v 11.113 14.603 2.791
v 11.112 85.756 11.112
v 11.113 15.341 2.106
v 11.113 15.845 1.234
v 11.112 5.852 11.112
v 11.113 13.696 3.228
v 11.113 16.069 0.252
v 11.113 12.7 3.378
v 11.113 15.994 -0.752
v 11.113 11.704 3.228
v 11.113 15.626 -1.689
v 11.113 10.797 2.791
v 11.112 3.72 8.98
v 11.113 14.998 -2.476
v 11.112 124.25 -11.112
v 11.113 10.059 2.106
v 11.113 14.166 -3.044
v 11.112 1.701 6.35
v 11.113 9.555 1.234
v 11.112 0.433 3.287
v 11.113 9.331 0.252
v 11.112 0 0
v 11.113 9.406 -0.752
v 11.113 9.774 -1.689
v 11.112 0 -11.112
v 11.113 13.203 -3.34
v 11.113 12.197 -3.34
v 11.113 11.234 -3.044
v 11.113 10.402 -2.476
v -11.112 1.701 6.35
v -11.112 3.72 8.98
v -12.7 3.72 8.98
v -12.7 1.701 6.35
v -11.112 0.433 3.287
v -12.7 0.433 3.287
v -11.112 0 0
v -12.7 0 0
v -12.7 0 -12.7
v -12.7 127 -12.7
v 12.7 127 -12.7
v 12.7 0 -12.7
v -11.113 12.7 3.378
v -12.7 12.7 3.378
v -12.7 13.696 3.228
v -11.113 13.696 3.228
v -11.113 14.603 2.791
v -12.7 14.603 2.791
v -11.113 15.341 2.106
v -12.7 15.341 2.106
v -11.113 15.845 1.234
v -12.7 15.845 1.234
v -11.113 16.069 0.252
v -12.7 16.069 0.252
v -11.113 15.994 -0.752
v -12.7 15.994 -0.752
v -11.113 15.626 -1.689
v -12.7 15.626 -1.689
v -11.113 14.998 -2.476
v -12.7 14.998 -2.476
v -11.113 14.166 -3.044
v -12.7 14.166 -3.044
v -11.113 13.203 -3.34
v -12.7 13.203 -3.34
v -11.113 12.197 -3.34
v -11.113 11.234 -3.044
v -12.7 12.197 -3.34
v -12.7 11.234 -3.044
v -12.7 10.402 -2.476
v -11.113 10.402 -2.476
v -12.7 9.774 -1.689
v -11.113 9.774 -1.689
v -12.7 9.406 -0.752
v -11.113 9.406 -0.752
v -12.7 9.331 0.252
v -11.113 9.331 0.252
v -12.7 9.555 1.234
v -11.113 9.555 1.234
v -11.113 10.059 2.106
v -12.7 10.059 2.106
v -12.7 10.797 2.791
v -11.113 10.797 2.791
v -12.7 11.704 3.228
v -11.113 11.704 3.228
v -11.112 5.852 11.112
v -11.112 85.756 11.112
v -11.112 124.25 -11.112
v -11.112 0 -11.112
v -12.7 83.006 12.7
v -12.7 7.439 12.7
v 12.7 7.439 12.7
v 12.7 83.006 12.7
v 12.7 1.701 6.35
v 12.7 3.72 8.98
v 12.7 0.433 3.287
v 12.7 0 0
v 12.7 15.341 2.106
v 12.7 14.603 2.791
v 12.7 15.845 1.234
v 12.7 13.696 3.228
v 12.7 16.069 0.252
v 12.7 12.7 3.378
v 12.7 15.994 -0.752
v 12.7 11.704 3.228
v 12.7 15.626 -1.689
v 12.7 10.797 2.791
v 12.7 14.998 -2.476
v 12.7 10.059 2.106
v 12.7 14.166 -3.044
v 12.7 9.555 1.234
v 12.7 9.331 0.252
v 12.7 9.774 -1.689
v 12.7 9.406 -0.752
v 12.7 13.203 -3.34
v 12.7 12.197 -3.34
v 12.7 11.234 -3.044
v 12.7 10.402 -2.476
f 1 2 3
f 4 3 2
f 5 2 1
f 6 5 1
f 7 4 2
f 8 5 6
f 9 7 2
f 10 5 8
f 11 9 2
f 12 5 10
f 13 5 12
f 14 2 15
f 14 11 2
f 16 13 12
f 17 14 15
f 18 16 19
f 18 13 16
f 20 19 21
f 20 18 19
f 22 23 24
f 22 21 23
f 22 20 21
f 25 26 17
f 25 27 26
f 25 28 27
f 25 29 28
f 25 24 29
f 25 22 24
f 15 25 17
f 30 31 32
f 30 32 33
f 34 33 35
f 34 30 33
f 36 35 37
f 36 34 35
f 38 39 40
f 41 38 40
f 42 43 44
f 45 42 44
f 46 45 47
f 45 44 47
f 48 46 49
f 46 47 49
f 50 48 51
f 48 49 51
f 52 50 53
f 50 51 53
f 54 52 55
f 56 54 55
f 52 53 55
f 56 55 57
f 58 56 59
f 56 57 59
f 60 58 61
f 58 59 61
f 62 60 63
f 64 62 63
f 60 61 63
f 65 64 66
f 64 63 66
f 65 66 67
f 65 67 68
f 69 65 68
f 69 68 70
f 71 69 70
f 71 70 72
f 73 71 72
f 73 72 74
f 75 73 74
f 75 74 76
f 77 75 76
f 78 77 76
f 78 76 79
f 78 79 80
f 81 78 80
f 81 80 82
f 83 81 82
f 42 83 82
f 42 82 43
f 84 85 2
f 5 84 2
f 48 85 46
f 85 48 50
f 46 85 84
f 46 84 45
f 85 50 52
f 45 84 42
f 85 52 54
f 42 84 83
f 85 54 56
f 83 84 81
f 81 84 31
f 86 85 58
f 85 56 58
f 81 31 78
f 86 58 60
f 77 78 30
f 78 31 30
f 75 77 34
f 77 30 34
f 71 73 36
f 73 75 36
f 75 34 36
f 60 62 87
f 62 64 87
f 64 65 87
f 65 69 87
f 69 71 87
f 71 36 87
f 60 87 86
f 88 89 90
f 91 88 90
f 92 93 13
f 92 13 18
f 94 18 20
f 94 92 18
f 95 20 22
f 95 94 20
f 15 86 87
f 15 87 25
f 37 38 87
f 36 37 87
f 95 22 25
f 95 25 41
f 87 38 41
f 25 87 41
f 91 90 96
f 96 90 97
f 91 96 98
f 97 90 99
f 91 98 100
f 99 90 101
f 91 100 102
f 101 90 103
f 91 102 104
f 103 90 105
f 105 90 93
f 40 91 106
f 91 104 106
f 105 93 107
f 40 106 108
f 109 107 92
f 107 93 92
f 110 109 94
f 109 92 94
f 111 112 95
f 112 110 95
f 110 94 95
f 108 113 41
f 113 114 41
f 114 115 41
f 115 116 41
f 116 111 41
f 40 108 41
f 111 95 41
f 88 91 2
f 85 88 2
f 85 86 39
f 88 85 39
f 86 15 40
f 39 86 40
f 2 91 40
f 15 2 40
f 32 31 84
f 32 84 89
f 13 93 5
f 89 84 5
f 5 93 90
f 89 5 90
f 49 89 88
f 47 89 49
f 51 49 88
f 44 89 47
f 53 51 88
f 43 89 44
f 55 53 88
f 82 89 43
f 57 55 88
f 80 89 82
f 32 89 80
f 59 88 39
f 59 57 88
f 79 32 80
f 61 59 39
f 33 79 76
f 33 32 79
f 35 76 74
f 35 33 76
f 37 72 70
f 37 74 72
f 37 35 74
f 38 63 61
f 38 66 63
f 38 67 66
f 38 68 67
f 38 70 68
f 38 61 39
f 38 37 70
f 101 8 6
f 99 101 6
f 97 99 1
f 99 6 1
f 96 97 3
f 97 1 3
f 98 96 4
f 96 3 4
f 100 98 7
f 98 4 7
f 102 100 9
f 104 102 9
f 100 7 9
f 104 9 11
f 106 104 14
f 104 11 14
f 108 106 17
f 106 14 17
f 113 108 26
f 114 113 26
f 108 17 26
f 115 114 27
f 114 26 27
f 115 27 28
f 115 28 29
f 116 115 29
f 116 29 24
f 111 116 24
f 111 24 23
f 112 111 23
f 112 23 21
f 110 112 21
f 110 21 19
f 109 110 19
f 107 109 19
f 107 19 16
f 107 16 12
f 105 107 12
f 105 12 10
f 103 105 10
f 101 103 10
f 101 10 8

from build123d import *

# Parameters (mm, degrees)
SKETCH1_W               = 25.4
SKETCH1_H               = 25.4
SKETCH1_W_2             = 22.225
SKETCH1_H_2             = 22.225
EXTRUDE1_DEPTH          = 127
EXTRUDE3_DEPTH          = 131.136274728
F_1_4_CLEARANCE_HOLE1_D = 6.7564
EXTRUDE4_DEPTH          = 131.136274728
EXTRUDE5_DEPTH          = 131.136274728


with BuildPart() as part:
    # Sketch1 → Extrude1 (new body)
    with BuildSketch(Plane(origin=(0, 0, 0), x_dir=(1, 0, 0), z_dir=(0, 1, 0))):
        Rectangle(SKETCH1_W, SKETCH1_H)
        Rectangle(SKETCH1_W_2, SKETCH1_H_2, mode=Mode.SUBTRACT)
    extrude(amount=EXTRUDE1_DEPTH)

    # Sketch3 → Extrude3 (cut, through all)
    with BuildSketch(Plane(origin=(12.7, 0, 0), x_dir=(0, 0, -1), z_dir=(1, 0, 0))):
        Polygon((12.7, 127), (-12.7, 127), (-12.7, 83.005909488), align=None)
    extrude(amount=-EXTRUDE3_DEPTH, mode=Mode.SUBTRACT)

    # 1/4 Clearance Hole1 (through all)
    with Locations(Plane(origin=(12.7, 0, 0), x_dir=(0, 0, -1), z_dir=(1, 0, 0))):
        with Locations((0, 12.7)):
            Hole(F_1_4_CLEARANCE_HOLE1_D / 2)

    # Sketch7 → Extrude4 (cut, through all)
    with BuildSketch(Plane(origin=(12.7, 0, 0), x_dir=(0, 0, -1), z_dir=(1, 0, 0))):
        Polygon((-5.260512242, 0), (-12.7, 7.439487758), (-12.7, 0), align=None)
    extrude(amount=-EXTRUDE4_DEPTH, mode=Mode.SUBTRACT)

    # Sketch8 → Extrude5 (cut, through all)
    with BuildSketch(Plane(origin=(12.7, 0, 0), x_dir=(0, 0, -1), z_dir=(1, 0, 0))):
        with BuildLine():
            Line((0, 0), (-5.260512242, 0))
            Line((-5.260512242, 0), (-8.980256121, 3.719743879))
            ThreePointArc((-8.980256121, 3.719743879), (-4.860079591, 0.966729937), (0, 0))
        make_face()
    extrude(amount=-EXTRUDE5_DEPTH, mode=Mode.SUBTRACT)


solid = part.part
